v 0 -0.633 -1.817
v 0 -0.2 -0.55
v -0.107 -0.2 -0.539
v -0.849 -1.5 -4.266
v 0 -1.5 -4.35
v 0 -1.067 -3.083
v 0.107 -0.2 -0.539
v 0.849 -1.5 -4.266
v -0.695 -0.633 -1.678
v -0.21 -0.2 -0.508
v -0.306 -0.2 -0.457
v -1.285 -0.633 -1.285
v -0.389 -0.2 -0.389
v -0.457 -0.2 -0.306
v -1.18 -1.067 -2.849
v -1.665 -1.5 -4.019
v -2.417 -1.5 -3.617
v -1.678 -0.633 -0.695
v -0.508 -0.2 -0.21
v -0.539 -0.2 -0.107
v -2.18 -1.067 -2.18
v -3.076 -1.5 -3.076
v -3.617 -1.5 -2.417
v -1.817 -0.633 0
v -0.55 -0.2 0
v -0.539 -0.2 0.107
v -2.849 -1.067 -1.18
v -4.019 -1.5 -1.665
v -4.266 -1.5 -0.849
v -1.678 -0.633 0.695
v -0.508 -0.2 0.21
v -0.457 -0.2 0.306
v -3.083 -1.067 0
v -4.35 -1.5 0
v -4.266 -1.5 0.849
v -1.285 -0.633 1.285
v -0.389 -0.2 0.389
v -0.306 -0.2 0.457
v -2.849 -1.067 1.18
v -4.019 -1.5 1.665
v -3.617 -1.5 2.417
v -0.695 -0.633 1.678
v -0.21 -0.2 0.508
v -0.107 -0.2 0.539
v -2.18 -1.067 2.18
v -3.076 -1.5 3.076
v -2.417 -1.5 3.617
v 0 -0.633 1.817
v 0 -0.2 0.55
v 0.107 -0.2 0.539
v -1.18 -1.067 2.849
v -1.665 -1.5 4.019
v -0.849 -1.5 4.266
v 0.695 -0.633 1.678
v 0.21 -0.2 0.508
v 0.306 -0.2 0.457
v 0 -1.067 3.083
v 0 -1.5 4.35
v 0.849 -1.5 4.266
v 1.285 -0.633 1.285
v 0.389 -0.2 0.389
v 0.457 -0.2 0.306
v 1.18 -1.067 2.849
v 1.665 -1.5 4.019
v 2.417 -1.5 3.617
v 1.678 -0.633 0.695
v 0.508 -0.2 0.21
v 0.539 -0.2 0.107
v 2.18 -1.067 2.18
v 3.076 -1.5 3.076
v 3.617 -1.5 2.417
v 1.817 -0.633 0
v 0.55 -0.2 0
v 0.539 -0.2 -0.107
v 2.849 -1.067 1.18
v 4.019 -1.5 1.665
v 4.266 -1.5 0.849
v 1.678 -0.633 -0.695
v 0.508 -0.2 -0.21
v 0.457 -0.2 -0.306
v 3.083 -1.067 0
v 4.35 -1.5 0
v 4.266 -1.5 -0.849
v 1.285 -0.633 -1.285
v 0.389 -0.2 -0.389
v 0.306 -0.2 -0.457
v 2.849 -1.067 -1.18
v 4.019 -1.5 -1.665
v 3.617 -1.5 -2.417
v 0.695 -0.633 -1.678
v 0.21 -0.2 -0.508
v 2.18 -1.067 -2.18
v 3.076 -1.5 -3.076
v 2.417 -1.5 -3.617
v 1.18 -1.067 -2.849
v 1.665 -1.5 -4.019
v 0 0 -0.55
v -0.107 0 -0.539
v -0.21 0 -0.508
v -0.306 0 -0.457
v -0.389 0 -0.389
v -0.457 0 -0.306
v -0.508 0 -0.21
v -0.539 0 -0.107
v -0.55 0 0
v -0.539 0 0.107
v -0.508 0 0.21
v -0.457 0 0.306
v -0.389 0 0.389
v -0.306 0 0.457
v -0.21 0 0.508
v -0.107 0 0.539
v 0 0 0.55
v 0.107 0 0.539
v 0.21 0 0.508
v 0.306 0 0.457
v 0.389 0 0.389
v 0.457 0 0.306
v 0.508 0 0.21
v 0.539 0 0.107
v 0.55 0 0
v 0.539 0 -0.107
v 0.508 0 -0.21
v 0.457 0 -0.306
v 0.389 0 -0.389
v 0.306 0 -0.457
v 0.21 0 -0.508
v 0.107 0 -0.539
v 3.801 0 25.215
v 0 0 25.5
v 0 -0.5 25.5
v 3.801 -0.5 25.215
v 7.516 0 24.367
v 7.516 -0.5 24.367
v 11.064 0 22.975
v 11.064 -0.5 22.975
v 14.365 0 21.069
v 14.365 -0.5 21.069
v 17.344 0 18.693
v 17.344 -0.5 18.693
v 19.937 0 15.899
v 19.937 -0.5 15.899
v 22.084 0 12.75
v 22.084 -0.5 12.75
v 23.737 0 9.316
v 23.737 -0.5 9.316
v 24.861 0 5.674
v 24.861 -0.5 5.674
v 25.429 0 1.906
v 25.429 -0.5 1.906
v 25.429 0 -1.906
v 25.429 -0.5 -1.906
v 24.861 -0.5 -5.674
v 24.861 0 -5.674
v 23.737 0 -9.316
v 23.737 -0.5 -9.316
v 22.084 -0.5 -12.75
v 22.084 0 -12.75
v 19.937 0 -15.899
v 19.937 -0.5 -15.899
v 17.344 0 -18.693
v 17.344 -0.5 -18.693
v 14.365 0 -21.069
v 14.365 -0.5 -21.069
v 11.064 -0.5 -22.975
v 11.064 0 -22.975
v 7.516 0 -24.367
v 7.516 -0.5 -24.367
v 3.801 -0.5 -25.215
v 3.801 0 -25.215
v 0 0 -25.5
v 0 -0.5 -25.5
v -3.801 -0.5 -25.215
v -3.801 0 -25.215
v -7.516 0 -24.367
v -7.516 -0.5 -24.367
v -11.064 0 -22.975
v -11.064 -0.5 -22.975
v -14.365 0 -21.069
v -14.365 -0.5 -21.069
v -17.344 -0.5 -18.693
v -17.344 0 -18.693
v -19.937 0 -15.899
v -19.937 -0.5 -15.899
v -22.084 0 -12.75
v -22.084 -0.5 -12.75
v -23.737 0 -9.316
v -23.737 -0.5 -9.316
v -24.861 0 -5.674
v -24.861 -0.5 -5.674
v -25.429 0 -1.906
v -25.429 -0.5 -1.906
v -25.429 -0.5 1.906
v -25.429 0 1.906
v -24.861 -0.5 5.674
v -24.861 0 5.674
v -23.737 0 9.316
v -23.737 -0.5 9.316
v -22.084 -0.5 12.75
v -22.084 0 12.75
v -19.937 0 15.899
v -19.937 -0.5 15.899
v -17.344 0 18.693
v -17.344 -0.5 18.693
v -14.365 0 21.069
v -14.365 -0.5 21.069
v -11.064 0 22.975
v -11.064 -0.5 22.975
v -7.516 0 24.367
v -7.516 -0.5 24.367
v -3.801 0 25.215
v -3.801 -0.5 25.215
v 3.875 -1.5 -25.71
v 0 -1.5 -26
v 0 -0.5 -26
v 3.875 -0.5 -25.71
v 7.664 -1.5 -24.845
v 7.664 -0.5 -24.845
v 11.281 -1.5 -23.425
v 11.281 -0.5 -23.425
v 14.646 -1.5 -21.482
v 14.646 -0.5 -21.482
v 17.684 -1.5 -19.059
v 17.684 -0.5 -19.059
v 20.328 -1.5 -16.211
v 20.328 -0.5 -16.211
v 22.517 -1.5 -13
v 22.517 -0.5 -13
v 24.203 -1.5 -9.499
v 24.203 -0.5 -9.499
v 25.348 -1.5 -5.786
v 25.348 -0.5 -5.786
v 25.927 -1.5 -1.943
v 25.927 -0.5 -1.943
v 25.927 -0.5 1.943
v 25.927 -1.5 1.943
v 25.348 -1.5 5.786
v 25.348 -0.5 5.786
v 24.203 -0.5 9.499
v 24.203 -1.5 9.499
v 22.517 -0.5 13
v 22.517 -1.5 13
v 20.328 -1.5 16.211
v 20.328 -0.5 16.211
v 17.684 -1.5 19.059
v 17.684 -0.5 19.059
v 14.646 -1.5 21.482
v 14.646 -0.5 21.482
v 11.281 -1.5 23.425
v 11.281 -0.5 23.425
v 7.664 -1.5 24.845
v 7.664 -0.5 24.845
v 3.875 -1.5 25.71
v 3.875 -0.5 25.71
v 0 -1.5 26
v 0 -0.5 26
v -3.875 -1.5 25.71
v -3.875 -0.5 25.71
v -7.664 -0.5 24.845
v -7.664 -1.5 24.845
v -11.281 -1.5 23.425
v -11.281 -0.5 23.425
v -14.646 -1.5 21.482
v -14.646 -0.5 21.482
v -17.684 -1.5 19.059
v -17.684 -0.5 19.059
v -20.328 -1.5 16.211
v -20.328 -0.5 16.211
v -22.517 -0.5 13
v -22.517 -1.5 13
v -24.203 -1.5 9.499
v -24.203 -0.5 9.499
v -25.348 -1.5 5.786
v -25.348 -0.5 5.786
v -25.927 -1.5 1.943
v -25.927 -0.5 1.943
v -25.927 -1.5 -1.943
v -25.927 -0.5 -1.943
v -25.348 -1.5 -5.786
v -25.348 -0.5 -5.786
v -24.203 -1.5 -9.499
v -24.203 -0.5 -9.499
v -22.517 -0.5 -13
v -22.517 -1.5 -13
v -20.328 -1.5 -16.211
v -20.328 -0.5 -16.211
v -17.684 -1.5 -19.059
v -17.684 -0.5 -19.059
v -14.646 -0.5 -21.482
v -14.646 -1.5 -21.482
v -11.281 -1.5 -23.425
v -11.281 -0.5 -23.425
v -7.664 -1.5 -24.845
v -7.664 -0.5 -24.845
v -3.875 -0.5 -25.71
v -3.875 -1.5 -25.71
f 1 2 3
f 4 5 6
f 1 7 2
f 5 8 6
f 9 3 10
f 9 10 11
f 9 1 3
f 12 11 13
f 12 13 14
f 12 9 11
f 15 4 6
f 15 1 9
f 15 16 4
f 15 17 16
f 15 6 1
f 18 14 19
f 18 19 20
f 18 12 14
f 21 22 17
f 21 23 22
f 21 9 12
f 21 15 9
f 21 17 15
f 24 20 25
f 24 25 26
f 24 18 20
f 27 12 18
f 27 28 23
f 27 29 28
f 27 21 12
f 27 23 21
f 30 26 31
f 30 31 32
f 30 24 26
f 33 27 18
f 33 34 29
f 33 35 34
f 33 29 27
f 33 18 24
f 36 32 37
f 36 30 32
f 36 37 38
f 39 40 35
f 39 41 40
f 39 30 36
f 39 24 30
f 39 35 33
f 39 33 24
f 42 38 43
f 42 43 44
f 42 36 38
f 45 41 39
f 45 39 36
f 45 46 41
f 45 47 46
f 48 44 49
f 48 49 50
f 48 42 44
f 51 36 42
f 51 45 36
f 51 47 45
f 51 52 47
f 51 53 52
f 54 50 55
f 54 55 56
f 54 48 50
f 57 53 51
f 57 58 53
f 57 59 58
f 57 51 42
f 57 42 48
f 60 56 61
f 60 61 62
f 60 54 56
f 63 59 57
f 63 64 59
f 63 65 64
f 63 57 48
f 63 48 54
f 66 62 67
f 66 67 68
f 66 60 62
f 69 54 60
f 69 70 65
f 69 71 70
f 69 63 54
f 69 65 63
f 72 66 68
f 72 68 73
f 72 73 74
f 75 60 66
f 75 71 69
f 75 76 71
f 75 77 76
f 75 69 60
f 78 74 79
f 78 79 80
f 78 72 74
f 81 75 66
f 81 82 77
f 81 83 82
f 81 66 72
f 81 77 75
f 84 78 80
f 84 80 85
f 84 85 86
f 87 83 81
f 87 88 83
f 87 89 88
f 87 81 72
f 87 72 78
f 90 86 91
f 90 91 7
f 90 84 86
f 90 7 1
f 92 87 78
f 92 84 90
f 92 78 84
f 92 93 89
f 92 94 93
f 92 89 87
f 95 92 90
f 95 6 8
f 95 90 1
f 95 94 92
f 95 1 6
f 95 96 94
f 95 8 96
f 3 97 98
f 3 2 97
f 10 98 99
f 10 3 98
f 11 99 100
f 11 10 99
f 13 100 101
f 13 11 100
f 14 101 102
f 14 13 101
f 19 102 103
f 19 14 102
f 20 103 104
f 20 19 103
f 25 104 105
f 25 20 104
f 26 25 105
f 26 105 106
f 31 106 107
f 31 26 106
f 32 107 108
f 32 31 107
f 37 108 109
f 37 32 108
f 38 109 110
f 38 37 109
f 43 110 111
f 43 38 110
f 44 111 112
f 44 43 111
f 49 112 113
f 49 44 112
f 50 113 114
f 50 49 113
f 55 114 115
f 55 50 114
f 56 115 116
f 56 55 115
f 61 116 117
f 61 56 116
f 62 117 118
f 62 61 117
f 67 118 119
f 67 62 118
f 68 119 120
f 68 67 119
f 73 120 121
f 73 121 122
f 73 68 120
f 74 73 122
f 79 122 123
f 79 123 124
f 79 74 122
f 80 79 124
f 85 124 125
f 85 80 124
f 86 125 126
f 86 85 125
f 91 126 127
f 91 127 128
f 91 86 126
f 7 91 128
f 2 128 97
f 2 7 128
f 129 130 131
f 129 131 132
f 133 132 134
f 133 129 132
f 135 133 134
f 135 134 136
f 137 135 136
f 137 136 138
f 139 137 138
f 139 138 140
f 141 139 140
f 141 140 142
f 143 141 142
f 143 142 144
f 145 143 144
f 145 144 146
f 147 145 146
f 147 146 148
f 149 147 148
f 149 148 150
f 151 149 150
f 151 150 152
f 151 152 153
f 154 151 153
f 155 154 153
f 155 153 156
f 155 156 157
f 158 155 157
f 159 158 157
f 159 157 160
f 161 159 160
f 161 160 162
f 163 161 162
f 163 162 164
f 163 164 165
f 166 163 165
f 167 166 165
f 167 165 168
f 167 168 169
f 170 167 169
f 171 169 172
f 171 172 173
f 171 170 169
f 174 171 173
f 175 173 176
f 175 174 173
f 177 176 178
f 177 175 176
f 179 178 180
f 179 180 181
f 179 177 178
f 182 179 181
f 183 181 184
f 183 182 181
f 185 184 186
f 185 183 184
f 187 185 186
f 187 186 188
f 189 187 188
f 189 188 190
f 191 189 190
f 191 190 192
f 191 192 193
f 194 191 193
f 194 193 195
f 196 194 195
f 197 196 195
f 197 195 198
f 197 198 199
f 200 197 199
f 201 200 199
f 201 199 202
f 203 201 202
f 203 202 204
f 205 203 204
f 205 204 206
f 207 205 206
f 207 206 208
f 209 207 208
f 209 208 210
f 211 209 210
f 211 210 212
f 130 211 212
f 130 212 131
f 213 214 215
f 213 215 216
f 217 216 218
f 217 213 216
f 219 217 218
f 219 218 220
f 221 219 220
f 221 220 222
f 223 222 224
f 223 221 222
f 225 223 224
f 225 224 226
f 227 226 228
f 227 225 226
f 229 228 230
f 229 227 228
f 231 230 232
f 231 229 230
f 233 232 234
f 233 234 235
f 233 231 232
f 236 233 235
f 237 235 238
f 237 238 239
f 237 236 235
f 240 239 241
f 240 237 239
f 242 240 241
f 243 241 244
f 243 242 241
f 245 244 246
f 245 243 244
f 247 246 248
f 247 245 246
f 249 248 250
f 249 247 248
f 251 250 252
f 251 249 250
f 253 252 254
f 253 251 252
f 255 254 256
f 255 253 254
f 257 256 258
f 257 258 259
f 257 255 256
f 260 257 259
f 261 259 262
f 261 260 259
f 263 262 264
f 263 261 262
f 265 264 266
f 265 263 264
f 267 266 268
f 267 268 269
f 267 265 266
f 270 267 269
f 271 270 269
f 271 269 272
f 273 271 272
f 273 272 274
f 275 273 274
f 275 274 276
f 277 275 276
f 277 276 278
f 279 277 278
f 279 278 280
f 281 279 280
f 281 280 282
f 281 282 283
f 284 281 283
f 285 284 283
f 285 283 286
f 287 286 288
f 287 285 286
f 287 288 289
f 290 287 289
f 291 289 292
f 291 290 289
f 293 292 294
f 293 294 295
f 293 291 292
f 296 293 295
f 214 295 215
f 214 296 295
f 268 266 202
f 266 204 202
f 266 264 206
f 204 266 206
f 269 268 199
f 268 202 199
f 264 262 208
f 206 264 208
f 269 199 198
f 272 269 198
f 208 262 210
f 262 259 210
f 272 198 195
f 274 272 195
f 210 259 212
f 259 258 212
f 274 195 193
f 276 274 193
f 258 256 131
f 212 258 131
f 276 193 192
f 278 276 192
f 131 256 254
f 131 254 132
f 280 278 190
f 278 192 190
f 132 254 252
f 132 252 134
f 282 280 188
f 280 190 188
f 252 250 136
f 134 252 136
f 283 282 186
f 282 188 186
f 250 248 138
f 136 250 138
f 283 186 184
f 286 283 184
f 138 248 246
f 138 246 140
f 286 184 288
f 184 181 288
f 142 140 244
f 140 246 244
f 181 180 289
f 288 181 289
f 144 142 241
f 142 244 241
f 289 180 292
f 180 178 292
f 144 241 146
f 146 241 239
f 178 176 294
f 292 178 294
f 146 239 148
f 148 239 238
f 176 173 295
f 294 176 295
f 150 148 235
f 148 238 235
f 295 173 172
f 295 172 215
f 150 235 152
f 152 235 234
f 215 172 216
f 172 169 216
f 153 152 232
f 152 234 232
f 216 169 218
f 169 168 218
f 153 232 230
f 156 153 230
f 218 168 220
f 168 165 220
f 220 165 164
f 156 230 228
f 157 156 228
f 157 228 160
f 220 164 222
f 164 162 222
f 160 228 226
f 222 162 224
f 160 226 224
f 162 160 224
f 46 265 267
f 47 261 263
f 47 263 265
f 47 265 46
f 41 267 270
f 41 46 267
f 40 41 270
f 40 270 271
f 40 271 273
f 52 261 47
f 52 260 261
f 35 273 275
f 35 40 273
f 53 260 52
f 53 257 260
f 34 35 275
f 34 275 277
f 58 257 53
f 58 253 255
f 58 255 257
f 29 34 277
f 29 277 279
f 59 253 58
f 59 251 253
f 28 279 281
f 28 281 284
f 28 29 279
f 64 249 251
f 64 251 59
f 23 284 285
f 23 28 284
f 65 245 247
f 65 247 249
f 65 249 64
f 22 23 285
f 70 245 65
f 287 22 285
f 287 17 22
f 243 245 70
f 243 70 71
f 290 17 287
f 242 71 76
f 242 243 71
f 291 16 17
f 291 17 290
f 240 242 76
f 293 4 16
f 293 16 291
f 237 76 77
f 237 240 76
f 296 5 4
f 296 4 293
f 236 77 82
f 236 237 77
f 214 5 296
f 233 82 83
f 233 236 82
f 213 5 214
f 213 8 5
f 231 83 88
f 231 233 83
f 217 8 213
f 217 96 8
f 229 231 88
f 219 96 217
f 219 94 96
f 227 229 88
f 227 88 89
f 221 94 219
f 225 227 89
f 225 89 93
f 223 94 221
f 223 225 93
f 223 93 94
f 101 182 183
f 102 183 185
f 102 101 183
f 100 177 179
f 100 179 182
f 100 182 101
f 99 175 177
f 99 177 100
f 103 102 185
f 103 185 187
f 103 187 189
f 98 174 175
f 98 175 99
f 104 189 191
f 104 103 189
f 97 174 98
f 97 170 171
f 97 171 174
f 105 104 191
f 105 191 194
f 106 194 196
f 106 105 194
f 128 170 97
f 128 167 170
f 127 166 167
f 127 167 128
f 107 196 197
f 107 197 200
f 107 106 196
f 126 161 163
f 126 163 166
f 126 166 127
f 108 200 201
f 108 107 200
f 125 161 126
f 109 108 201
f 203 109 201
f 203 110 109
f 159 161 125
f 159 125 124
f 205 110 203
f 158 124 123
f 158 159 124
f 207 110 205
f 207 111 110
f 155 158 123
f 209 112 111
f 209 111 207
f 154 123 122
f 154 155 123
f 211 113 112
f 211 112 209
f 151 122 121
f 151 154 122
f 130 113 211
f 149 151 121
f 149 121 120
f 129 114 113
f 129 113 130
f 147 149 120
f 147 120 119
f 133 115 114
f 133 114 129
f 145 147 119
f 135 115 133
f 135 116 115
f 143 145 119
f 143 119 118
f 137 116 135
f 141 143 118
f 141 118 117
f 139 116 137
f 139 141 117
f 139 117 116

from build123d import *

# Parameters (mm, degrees)
SKETCH1_R           = 25.5
BOSS_EXTRUDE1_DEPTH = 1.5
SKETCH2_R           = 26
BOSS_EXTRUDE2_DEPTH = 1
SKETCH3_R           = 0.55
CUT_EXTRUDE1_DEPTH  = 37.783148315


with BuildPart() as part:
    # Sketch1 → Boss-Extrude1 (new body)
    with BuildSketch(Plane(origin=(0, 0, 0), x_dir=(1, 0, 0), z_dir=(0, 1, 0))):
        with Locations(Location((0, 0, 0), (0, 0, 270))):
            Circle(SKETCH1_R)
    extrude(amount=-BOSS_EXTRUDE1_DEPTH)

    # Sketch2 → Boss-Extrude2 (add)
    with BuildSketch(Plane(origin=(0, -1.5, 0), x_dir=(-1, 0, 0), z_dir=(0, -1, 0))):
        with Locations(Location((0, 0, 0), (0, 0, 90))):
            Circle(SKETCH2_R)
    extrude(amount=-BOSS_EXTRUDE2_DEPTH)

    # Sketch3 → Cut-Extrude1 (cut, through all)
    with BuildSketch(Plane(origin=(0, -0.5, 0), x_dir=(1, 0, 0), z_dir=(0, 1, 0))):
        with Locations(Location((0, 0, 0), (0, 0, 270))):
            Circle(SKETCH3_R)
    extrude(amount=-CUT_EXTRUDE1_DEPTH, mode=Mode.SUBTRACT)

    # Sketch4 → Cut-Revolve1 (revolve, cut)
    with BuildSketch(Plane.XY, mode=Mode.PRIVATE) as cut_revolve1_sk:
        Polygon((-4.35, -1.5), (0, -1.5), (0, 0), (-0.55, 0), (-0.55, -0.2), align=None)
    revolve(cut_revolve1_sk.sketch.rotate(Axis((0, -1.5, 0), (0, 1, 0)), 270), axis=Axis((0, -1.5, 0), (0, 1, 0)), mode=Mode.SUBTRACT)


solid = part.part
